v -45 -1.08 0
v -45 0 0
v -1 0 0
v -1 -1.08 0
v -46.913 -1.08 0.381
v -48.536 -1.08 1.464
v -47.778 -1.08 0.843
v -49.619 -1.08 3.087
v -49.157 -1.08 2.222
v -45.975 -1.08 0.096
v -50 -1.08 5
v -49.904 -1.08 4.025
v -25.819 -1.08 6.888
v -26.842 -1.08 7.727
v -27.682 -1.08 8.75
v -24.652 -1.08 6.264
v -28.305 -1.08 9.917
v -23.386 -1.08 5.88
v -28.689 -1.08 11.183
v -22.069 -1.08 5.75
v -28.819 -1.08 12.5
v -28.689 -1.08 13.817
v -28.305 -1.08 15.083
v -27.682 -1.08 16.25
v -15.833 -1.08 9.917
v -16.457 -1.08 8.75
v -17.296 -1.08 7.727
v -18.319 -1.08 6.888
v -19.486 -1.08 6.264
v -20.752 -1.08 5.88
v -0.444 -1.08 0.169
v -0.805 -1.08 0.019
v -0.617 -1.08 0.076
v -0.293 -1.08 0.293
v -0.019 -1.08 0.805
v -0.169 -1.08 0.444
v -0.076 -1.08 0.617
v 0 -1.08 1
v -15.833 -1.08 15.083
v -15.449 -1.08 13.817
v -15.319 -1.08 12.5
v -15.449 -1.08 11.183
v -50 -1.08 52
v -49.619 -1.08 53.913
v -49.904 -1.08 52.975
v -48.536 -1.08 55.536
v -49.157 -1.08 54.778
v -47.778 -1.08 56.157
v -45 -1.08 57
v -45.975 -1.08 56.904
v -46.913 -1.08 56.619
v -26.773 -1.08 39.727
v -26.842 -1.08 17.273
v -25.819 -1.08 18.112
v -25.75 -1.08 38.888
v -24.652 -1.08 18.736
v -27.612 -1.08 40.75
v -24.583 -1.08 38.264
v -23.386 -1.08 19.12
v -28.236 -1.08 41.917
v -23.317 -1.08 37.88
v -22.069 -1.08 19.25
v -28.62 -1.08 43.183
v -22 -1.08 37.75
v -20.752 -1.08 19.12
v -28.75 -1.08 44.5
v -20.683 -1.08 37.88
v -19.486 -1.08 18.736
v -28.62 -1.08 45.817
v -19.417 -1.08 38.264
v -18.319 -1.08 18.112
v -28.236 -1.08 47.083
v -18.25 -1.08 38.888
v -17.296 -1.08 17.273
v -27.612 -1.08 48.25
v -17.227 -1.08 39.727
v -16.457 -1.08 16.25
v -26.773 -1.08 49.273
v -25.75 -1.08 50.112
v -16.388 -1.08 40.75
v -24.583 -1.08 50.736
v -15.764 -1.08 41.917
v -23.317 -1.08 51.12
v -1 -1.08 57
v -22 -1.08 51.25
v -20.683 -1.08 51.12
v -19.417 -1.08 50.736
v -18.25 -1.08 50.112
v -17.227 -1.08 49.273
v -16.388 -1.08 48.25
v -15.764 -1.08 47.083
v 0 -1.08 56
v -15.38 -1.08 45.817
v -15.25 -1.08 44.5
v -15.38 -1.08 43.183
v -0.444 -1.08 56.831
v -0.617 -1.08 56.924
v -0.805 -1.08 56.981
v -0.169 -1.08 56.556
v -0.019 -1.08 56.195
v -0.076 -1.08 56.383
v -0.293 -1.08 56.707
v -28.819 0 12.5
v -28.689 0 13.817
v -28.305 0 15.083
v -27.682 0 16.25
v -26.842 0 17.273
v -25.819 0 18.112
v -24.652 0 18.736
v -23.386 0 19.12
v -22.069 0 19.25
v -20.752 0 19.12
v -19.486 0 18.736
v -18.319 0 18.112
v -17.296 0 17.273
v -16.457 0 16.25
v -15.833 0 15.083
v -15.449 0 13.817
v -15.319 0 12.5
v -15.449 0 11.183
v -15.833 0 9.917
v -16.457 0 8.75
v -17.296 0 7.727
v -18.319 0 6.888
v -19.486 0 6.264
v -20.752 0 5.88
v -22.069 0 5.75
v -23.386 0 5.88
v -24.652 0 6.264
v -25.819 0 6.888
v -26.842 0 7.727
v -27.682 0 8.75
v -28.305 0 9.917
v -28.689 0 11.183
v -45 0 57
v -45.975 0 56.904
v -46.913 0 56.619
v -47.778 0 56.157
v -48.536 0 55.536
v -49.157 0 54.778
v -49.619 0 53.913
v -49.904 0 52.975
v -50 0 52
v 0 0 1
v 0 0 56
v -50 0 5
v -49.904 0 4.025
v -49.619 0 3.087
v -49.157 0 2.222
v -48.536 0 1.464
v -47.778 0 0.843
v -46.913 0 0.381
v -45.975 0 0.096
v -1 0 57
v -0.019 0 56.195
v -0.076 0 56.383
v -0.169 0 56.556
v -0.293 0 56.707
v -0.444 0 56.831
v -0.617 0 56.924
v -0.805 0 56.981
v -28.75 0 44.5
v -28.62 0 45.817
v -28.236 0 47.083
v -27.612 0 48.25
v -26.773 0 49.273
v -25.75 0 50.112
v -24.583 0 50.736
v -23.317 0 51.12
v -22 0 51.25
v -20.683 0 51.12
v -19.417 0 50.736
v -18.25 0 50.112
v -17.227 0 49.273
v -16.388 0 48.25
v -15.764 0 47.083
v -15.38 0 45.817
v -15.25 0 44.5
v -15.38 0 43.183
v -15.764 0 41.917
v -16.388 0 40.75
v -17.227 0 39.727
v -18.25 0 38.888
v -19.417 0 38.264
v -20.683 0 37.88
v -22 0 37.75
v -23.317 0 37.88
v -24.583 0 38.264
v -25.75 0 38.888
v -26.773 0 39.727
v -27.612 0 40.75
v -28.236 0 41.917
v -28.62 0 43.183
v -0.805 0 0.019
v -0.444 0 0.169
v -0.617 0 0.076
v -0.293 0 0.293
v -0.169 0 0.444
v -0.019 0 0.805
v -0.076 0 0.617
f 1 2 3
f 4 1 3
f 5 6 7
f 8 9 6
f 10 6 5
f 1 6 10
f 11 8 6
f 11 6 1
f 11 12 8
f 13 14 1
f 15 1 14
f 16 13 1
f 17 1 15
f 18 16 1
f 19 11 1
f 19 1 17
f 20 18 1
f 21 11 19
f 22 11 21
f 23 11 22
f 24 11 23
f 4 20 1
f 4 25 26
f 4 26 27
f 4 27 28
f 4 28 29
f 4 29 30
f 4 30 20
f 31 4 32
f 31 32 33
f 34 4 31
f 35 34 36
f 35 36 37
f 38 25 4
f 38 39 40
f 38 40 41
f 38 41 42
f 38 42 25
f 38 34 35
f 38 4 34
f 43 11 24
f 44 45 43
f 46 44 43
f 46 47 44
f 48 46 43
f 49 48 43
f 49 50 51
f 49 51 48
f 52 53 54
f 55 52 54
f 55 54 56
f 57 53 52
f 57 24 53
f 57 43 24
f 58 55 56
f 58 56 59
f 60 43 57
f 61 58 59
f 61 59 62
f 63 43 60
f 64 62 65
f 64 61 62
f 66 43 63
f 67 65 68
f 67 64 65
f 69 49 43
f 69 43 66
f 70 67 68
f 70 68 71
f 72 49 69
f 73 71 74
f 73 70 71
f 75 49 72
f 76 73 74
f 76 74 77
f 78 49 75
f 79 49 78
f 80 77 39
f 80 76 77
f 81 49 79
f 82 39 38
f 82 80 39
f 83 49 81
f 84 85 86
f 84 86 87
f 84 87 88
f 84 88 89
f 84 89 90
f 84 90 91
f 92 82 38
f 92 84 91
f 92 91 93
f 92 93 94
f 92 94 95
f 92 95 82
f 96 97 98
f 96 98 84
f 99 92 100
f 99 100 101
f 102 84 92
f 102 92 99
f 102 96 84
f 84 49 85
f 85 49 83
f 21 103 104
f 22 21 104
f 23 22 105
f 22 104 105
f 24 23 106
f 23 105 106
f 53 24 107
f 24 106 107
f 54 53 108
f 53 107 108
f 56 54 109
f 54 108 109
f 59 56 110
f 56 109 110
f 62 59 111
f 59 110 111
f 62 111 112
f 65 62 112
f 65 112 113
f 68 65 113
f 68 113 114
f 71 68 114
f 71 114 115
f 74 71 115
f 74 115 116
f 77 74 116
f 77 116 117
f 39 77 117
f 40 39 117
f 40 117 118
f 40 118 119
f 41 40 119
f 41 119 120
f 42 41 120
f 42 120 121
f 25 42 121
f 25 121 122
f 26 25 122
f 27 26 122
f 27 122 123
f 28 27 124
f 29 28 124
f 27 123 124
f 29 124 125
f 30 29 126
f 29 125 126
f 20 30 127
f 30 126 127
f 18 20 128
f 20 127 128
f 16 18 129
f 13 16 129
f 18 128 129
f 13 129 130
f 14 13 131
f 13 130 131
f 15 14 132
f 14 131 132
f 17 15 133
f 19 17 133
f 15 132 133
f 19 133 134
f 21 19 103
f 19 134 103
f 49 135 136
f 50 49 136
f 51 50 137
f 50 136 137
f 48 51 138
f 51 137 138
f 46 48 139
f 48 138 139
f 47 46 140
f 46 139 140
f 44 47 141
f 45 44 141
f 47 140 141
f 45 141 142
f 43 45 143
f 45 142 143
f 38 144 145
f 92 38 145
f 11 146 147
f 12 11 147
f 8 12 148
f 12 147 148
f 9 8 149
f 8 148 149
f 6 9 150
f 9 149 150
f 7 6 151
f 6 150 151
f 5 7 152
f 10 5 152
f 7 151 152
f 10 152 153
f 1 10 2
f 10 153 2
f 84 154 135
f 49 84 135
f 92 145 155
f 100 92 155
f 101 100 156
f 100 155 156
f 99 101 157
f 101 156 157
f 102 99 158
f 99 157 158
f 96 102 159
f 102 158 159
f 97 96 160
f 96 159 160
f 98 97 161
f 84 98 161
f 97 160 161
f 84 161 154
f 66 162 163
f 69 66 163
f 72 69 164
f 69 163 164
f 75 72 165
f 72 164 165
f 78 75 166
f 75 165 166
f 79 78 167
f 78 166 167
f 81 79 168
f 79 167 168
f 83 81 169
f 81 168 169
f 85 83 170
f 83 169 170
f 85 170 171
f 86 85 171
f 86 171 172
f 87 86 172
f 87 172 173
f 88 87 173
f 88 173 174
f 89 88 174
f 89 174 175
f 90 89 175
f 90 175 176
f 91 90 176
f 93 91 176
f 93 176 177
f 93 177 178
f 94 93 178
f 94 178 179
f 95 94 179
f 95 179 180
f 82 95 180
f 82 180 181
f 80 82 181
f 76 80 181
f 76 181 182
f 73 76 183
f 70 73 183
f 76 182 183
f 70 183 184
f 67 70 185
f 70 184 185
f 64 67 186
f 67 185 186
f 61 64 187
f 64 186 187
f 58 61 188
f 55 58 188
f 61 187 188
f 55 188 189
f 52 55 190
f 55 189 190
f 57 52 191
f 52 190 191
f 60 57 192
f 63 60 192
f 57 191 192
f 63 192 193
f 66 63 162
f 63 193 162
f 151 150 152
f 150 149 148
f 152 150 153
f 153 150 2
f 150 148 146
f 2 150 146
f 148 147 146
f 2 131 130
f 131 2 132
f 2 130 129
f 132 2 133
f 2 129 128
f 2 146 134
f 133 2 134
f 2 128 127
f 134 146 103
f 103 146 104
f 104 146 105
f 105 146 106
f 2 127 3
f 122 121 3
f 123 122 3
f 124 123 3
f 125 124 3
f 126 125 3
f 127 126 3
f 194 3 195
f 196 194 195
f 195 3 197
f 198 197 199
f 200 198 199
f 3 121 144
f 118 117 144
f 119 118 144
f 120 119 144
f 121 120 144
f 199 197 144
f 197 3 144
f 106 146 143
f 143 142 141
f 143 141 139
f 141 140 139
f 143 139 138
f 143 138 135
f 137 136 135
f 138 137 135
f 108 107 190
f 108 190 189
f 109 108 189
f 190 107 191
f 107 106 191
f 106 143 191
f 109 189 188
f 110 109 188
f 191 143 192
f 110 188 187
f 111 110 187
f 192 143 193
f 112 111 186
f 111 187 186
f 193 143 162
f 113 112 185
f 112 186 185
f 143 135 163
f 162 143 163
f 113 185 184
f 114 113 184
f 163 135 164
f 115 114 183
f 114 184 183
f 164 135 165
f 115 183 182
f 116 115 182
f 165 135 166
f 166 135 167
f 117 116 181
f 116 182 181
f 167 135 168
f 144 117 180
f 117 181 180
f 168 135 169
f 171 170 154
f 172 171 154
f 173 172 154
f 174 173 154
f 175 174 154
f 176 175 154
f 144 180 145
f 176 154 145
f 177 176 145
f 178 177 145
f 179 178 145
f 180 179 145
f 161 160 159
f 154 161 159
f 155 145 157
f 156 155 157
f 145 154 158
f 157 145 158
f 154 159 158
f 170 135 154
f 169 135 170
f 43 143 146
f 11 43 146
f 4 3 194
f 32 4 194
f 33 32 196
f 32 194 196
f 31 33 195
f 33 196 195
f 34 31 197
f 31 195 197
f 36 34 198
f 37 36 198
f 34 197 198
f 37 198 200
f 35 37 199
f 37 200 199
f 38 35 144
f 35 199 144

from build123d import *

# Parameters (mm, degrees)
F1_DEPTH = 1.08
F3_D     = 13.5


with BuildPart() as f1:
    # F0 (on Front) → F1 (new body)
    with BuildSketch(Plane.XZ):
        with BuildLine():
            Line((-45, 0), (-1, 0))
            ThreePointArc((-1, 0), (-0.292893, 0.292893), (0, 1))
            Line((0, 1), (0, 56))
            ThreePointArc((0, 56), (-0.292893, 56.707107), (-1, 57))
            Line((-1, 57), (-45, 57))
            ThreePointArc((-45, 57), (-48.535534, 55.535534), (-50, 52))
            Line((-50, 52), (-50, 5))
            ThreePointArc((-50, 5), (-48.535534, 1.464466), (-45, 0))
        make_face()
    extrude(amount=F1_DEPTH)

    # F3 (through all)
    with Locations(Plane.XZ.offset(1.08)):
        with Locations((-22, 44.5), (-22.069119, 12.5)):
            Hole(F3_D / 2)


solid = f1.part
